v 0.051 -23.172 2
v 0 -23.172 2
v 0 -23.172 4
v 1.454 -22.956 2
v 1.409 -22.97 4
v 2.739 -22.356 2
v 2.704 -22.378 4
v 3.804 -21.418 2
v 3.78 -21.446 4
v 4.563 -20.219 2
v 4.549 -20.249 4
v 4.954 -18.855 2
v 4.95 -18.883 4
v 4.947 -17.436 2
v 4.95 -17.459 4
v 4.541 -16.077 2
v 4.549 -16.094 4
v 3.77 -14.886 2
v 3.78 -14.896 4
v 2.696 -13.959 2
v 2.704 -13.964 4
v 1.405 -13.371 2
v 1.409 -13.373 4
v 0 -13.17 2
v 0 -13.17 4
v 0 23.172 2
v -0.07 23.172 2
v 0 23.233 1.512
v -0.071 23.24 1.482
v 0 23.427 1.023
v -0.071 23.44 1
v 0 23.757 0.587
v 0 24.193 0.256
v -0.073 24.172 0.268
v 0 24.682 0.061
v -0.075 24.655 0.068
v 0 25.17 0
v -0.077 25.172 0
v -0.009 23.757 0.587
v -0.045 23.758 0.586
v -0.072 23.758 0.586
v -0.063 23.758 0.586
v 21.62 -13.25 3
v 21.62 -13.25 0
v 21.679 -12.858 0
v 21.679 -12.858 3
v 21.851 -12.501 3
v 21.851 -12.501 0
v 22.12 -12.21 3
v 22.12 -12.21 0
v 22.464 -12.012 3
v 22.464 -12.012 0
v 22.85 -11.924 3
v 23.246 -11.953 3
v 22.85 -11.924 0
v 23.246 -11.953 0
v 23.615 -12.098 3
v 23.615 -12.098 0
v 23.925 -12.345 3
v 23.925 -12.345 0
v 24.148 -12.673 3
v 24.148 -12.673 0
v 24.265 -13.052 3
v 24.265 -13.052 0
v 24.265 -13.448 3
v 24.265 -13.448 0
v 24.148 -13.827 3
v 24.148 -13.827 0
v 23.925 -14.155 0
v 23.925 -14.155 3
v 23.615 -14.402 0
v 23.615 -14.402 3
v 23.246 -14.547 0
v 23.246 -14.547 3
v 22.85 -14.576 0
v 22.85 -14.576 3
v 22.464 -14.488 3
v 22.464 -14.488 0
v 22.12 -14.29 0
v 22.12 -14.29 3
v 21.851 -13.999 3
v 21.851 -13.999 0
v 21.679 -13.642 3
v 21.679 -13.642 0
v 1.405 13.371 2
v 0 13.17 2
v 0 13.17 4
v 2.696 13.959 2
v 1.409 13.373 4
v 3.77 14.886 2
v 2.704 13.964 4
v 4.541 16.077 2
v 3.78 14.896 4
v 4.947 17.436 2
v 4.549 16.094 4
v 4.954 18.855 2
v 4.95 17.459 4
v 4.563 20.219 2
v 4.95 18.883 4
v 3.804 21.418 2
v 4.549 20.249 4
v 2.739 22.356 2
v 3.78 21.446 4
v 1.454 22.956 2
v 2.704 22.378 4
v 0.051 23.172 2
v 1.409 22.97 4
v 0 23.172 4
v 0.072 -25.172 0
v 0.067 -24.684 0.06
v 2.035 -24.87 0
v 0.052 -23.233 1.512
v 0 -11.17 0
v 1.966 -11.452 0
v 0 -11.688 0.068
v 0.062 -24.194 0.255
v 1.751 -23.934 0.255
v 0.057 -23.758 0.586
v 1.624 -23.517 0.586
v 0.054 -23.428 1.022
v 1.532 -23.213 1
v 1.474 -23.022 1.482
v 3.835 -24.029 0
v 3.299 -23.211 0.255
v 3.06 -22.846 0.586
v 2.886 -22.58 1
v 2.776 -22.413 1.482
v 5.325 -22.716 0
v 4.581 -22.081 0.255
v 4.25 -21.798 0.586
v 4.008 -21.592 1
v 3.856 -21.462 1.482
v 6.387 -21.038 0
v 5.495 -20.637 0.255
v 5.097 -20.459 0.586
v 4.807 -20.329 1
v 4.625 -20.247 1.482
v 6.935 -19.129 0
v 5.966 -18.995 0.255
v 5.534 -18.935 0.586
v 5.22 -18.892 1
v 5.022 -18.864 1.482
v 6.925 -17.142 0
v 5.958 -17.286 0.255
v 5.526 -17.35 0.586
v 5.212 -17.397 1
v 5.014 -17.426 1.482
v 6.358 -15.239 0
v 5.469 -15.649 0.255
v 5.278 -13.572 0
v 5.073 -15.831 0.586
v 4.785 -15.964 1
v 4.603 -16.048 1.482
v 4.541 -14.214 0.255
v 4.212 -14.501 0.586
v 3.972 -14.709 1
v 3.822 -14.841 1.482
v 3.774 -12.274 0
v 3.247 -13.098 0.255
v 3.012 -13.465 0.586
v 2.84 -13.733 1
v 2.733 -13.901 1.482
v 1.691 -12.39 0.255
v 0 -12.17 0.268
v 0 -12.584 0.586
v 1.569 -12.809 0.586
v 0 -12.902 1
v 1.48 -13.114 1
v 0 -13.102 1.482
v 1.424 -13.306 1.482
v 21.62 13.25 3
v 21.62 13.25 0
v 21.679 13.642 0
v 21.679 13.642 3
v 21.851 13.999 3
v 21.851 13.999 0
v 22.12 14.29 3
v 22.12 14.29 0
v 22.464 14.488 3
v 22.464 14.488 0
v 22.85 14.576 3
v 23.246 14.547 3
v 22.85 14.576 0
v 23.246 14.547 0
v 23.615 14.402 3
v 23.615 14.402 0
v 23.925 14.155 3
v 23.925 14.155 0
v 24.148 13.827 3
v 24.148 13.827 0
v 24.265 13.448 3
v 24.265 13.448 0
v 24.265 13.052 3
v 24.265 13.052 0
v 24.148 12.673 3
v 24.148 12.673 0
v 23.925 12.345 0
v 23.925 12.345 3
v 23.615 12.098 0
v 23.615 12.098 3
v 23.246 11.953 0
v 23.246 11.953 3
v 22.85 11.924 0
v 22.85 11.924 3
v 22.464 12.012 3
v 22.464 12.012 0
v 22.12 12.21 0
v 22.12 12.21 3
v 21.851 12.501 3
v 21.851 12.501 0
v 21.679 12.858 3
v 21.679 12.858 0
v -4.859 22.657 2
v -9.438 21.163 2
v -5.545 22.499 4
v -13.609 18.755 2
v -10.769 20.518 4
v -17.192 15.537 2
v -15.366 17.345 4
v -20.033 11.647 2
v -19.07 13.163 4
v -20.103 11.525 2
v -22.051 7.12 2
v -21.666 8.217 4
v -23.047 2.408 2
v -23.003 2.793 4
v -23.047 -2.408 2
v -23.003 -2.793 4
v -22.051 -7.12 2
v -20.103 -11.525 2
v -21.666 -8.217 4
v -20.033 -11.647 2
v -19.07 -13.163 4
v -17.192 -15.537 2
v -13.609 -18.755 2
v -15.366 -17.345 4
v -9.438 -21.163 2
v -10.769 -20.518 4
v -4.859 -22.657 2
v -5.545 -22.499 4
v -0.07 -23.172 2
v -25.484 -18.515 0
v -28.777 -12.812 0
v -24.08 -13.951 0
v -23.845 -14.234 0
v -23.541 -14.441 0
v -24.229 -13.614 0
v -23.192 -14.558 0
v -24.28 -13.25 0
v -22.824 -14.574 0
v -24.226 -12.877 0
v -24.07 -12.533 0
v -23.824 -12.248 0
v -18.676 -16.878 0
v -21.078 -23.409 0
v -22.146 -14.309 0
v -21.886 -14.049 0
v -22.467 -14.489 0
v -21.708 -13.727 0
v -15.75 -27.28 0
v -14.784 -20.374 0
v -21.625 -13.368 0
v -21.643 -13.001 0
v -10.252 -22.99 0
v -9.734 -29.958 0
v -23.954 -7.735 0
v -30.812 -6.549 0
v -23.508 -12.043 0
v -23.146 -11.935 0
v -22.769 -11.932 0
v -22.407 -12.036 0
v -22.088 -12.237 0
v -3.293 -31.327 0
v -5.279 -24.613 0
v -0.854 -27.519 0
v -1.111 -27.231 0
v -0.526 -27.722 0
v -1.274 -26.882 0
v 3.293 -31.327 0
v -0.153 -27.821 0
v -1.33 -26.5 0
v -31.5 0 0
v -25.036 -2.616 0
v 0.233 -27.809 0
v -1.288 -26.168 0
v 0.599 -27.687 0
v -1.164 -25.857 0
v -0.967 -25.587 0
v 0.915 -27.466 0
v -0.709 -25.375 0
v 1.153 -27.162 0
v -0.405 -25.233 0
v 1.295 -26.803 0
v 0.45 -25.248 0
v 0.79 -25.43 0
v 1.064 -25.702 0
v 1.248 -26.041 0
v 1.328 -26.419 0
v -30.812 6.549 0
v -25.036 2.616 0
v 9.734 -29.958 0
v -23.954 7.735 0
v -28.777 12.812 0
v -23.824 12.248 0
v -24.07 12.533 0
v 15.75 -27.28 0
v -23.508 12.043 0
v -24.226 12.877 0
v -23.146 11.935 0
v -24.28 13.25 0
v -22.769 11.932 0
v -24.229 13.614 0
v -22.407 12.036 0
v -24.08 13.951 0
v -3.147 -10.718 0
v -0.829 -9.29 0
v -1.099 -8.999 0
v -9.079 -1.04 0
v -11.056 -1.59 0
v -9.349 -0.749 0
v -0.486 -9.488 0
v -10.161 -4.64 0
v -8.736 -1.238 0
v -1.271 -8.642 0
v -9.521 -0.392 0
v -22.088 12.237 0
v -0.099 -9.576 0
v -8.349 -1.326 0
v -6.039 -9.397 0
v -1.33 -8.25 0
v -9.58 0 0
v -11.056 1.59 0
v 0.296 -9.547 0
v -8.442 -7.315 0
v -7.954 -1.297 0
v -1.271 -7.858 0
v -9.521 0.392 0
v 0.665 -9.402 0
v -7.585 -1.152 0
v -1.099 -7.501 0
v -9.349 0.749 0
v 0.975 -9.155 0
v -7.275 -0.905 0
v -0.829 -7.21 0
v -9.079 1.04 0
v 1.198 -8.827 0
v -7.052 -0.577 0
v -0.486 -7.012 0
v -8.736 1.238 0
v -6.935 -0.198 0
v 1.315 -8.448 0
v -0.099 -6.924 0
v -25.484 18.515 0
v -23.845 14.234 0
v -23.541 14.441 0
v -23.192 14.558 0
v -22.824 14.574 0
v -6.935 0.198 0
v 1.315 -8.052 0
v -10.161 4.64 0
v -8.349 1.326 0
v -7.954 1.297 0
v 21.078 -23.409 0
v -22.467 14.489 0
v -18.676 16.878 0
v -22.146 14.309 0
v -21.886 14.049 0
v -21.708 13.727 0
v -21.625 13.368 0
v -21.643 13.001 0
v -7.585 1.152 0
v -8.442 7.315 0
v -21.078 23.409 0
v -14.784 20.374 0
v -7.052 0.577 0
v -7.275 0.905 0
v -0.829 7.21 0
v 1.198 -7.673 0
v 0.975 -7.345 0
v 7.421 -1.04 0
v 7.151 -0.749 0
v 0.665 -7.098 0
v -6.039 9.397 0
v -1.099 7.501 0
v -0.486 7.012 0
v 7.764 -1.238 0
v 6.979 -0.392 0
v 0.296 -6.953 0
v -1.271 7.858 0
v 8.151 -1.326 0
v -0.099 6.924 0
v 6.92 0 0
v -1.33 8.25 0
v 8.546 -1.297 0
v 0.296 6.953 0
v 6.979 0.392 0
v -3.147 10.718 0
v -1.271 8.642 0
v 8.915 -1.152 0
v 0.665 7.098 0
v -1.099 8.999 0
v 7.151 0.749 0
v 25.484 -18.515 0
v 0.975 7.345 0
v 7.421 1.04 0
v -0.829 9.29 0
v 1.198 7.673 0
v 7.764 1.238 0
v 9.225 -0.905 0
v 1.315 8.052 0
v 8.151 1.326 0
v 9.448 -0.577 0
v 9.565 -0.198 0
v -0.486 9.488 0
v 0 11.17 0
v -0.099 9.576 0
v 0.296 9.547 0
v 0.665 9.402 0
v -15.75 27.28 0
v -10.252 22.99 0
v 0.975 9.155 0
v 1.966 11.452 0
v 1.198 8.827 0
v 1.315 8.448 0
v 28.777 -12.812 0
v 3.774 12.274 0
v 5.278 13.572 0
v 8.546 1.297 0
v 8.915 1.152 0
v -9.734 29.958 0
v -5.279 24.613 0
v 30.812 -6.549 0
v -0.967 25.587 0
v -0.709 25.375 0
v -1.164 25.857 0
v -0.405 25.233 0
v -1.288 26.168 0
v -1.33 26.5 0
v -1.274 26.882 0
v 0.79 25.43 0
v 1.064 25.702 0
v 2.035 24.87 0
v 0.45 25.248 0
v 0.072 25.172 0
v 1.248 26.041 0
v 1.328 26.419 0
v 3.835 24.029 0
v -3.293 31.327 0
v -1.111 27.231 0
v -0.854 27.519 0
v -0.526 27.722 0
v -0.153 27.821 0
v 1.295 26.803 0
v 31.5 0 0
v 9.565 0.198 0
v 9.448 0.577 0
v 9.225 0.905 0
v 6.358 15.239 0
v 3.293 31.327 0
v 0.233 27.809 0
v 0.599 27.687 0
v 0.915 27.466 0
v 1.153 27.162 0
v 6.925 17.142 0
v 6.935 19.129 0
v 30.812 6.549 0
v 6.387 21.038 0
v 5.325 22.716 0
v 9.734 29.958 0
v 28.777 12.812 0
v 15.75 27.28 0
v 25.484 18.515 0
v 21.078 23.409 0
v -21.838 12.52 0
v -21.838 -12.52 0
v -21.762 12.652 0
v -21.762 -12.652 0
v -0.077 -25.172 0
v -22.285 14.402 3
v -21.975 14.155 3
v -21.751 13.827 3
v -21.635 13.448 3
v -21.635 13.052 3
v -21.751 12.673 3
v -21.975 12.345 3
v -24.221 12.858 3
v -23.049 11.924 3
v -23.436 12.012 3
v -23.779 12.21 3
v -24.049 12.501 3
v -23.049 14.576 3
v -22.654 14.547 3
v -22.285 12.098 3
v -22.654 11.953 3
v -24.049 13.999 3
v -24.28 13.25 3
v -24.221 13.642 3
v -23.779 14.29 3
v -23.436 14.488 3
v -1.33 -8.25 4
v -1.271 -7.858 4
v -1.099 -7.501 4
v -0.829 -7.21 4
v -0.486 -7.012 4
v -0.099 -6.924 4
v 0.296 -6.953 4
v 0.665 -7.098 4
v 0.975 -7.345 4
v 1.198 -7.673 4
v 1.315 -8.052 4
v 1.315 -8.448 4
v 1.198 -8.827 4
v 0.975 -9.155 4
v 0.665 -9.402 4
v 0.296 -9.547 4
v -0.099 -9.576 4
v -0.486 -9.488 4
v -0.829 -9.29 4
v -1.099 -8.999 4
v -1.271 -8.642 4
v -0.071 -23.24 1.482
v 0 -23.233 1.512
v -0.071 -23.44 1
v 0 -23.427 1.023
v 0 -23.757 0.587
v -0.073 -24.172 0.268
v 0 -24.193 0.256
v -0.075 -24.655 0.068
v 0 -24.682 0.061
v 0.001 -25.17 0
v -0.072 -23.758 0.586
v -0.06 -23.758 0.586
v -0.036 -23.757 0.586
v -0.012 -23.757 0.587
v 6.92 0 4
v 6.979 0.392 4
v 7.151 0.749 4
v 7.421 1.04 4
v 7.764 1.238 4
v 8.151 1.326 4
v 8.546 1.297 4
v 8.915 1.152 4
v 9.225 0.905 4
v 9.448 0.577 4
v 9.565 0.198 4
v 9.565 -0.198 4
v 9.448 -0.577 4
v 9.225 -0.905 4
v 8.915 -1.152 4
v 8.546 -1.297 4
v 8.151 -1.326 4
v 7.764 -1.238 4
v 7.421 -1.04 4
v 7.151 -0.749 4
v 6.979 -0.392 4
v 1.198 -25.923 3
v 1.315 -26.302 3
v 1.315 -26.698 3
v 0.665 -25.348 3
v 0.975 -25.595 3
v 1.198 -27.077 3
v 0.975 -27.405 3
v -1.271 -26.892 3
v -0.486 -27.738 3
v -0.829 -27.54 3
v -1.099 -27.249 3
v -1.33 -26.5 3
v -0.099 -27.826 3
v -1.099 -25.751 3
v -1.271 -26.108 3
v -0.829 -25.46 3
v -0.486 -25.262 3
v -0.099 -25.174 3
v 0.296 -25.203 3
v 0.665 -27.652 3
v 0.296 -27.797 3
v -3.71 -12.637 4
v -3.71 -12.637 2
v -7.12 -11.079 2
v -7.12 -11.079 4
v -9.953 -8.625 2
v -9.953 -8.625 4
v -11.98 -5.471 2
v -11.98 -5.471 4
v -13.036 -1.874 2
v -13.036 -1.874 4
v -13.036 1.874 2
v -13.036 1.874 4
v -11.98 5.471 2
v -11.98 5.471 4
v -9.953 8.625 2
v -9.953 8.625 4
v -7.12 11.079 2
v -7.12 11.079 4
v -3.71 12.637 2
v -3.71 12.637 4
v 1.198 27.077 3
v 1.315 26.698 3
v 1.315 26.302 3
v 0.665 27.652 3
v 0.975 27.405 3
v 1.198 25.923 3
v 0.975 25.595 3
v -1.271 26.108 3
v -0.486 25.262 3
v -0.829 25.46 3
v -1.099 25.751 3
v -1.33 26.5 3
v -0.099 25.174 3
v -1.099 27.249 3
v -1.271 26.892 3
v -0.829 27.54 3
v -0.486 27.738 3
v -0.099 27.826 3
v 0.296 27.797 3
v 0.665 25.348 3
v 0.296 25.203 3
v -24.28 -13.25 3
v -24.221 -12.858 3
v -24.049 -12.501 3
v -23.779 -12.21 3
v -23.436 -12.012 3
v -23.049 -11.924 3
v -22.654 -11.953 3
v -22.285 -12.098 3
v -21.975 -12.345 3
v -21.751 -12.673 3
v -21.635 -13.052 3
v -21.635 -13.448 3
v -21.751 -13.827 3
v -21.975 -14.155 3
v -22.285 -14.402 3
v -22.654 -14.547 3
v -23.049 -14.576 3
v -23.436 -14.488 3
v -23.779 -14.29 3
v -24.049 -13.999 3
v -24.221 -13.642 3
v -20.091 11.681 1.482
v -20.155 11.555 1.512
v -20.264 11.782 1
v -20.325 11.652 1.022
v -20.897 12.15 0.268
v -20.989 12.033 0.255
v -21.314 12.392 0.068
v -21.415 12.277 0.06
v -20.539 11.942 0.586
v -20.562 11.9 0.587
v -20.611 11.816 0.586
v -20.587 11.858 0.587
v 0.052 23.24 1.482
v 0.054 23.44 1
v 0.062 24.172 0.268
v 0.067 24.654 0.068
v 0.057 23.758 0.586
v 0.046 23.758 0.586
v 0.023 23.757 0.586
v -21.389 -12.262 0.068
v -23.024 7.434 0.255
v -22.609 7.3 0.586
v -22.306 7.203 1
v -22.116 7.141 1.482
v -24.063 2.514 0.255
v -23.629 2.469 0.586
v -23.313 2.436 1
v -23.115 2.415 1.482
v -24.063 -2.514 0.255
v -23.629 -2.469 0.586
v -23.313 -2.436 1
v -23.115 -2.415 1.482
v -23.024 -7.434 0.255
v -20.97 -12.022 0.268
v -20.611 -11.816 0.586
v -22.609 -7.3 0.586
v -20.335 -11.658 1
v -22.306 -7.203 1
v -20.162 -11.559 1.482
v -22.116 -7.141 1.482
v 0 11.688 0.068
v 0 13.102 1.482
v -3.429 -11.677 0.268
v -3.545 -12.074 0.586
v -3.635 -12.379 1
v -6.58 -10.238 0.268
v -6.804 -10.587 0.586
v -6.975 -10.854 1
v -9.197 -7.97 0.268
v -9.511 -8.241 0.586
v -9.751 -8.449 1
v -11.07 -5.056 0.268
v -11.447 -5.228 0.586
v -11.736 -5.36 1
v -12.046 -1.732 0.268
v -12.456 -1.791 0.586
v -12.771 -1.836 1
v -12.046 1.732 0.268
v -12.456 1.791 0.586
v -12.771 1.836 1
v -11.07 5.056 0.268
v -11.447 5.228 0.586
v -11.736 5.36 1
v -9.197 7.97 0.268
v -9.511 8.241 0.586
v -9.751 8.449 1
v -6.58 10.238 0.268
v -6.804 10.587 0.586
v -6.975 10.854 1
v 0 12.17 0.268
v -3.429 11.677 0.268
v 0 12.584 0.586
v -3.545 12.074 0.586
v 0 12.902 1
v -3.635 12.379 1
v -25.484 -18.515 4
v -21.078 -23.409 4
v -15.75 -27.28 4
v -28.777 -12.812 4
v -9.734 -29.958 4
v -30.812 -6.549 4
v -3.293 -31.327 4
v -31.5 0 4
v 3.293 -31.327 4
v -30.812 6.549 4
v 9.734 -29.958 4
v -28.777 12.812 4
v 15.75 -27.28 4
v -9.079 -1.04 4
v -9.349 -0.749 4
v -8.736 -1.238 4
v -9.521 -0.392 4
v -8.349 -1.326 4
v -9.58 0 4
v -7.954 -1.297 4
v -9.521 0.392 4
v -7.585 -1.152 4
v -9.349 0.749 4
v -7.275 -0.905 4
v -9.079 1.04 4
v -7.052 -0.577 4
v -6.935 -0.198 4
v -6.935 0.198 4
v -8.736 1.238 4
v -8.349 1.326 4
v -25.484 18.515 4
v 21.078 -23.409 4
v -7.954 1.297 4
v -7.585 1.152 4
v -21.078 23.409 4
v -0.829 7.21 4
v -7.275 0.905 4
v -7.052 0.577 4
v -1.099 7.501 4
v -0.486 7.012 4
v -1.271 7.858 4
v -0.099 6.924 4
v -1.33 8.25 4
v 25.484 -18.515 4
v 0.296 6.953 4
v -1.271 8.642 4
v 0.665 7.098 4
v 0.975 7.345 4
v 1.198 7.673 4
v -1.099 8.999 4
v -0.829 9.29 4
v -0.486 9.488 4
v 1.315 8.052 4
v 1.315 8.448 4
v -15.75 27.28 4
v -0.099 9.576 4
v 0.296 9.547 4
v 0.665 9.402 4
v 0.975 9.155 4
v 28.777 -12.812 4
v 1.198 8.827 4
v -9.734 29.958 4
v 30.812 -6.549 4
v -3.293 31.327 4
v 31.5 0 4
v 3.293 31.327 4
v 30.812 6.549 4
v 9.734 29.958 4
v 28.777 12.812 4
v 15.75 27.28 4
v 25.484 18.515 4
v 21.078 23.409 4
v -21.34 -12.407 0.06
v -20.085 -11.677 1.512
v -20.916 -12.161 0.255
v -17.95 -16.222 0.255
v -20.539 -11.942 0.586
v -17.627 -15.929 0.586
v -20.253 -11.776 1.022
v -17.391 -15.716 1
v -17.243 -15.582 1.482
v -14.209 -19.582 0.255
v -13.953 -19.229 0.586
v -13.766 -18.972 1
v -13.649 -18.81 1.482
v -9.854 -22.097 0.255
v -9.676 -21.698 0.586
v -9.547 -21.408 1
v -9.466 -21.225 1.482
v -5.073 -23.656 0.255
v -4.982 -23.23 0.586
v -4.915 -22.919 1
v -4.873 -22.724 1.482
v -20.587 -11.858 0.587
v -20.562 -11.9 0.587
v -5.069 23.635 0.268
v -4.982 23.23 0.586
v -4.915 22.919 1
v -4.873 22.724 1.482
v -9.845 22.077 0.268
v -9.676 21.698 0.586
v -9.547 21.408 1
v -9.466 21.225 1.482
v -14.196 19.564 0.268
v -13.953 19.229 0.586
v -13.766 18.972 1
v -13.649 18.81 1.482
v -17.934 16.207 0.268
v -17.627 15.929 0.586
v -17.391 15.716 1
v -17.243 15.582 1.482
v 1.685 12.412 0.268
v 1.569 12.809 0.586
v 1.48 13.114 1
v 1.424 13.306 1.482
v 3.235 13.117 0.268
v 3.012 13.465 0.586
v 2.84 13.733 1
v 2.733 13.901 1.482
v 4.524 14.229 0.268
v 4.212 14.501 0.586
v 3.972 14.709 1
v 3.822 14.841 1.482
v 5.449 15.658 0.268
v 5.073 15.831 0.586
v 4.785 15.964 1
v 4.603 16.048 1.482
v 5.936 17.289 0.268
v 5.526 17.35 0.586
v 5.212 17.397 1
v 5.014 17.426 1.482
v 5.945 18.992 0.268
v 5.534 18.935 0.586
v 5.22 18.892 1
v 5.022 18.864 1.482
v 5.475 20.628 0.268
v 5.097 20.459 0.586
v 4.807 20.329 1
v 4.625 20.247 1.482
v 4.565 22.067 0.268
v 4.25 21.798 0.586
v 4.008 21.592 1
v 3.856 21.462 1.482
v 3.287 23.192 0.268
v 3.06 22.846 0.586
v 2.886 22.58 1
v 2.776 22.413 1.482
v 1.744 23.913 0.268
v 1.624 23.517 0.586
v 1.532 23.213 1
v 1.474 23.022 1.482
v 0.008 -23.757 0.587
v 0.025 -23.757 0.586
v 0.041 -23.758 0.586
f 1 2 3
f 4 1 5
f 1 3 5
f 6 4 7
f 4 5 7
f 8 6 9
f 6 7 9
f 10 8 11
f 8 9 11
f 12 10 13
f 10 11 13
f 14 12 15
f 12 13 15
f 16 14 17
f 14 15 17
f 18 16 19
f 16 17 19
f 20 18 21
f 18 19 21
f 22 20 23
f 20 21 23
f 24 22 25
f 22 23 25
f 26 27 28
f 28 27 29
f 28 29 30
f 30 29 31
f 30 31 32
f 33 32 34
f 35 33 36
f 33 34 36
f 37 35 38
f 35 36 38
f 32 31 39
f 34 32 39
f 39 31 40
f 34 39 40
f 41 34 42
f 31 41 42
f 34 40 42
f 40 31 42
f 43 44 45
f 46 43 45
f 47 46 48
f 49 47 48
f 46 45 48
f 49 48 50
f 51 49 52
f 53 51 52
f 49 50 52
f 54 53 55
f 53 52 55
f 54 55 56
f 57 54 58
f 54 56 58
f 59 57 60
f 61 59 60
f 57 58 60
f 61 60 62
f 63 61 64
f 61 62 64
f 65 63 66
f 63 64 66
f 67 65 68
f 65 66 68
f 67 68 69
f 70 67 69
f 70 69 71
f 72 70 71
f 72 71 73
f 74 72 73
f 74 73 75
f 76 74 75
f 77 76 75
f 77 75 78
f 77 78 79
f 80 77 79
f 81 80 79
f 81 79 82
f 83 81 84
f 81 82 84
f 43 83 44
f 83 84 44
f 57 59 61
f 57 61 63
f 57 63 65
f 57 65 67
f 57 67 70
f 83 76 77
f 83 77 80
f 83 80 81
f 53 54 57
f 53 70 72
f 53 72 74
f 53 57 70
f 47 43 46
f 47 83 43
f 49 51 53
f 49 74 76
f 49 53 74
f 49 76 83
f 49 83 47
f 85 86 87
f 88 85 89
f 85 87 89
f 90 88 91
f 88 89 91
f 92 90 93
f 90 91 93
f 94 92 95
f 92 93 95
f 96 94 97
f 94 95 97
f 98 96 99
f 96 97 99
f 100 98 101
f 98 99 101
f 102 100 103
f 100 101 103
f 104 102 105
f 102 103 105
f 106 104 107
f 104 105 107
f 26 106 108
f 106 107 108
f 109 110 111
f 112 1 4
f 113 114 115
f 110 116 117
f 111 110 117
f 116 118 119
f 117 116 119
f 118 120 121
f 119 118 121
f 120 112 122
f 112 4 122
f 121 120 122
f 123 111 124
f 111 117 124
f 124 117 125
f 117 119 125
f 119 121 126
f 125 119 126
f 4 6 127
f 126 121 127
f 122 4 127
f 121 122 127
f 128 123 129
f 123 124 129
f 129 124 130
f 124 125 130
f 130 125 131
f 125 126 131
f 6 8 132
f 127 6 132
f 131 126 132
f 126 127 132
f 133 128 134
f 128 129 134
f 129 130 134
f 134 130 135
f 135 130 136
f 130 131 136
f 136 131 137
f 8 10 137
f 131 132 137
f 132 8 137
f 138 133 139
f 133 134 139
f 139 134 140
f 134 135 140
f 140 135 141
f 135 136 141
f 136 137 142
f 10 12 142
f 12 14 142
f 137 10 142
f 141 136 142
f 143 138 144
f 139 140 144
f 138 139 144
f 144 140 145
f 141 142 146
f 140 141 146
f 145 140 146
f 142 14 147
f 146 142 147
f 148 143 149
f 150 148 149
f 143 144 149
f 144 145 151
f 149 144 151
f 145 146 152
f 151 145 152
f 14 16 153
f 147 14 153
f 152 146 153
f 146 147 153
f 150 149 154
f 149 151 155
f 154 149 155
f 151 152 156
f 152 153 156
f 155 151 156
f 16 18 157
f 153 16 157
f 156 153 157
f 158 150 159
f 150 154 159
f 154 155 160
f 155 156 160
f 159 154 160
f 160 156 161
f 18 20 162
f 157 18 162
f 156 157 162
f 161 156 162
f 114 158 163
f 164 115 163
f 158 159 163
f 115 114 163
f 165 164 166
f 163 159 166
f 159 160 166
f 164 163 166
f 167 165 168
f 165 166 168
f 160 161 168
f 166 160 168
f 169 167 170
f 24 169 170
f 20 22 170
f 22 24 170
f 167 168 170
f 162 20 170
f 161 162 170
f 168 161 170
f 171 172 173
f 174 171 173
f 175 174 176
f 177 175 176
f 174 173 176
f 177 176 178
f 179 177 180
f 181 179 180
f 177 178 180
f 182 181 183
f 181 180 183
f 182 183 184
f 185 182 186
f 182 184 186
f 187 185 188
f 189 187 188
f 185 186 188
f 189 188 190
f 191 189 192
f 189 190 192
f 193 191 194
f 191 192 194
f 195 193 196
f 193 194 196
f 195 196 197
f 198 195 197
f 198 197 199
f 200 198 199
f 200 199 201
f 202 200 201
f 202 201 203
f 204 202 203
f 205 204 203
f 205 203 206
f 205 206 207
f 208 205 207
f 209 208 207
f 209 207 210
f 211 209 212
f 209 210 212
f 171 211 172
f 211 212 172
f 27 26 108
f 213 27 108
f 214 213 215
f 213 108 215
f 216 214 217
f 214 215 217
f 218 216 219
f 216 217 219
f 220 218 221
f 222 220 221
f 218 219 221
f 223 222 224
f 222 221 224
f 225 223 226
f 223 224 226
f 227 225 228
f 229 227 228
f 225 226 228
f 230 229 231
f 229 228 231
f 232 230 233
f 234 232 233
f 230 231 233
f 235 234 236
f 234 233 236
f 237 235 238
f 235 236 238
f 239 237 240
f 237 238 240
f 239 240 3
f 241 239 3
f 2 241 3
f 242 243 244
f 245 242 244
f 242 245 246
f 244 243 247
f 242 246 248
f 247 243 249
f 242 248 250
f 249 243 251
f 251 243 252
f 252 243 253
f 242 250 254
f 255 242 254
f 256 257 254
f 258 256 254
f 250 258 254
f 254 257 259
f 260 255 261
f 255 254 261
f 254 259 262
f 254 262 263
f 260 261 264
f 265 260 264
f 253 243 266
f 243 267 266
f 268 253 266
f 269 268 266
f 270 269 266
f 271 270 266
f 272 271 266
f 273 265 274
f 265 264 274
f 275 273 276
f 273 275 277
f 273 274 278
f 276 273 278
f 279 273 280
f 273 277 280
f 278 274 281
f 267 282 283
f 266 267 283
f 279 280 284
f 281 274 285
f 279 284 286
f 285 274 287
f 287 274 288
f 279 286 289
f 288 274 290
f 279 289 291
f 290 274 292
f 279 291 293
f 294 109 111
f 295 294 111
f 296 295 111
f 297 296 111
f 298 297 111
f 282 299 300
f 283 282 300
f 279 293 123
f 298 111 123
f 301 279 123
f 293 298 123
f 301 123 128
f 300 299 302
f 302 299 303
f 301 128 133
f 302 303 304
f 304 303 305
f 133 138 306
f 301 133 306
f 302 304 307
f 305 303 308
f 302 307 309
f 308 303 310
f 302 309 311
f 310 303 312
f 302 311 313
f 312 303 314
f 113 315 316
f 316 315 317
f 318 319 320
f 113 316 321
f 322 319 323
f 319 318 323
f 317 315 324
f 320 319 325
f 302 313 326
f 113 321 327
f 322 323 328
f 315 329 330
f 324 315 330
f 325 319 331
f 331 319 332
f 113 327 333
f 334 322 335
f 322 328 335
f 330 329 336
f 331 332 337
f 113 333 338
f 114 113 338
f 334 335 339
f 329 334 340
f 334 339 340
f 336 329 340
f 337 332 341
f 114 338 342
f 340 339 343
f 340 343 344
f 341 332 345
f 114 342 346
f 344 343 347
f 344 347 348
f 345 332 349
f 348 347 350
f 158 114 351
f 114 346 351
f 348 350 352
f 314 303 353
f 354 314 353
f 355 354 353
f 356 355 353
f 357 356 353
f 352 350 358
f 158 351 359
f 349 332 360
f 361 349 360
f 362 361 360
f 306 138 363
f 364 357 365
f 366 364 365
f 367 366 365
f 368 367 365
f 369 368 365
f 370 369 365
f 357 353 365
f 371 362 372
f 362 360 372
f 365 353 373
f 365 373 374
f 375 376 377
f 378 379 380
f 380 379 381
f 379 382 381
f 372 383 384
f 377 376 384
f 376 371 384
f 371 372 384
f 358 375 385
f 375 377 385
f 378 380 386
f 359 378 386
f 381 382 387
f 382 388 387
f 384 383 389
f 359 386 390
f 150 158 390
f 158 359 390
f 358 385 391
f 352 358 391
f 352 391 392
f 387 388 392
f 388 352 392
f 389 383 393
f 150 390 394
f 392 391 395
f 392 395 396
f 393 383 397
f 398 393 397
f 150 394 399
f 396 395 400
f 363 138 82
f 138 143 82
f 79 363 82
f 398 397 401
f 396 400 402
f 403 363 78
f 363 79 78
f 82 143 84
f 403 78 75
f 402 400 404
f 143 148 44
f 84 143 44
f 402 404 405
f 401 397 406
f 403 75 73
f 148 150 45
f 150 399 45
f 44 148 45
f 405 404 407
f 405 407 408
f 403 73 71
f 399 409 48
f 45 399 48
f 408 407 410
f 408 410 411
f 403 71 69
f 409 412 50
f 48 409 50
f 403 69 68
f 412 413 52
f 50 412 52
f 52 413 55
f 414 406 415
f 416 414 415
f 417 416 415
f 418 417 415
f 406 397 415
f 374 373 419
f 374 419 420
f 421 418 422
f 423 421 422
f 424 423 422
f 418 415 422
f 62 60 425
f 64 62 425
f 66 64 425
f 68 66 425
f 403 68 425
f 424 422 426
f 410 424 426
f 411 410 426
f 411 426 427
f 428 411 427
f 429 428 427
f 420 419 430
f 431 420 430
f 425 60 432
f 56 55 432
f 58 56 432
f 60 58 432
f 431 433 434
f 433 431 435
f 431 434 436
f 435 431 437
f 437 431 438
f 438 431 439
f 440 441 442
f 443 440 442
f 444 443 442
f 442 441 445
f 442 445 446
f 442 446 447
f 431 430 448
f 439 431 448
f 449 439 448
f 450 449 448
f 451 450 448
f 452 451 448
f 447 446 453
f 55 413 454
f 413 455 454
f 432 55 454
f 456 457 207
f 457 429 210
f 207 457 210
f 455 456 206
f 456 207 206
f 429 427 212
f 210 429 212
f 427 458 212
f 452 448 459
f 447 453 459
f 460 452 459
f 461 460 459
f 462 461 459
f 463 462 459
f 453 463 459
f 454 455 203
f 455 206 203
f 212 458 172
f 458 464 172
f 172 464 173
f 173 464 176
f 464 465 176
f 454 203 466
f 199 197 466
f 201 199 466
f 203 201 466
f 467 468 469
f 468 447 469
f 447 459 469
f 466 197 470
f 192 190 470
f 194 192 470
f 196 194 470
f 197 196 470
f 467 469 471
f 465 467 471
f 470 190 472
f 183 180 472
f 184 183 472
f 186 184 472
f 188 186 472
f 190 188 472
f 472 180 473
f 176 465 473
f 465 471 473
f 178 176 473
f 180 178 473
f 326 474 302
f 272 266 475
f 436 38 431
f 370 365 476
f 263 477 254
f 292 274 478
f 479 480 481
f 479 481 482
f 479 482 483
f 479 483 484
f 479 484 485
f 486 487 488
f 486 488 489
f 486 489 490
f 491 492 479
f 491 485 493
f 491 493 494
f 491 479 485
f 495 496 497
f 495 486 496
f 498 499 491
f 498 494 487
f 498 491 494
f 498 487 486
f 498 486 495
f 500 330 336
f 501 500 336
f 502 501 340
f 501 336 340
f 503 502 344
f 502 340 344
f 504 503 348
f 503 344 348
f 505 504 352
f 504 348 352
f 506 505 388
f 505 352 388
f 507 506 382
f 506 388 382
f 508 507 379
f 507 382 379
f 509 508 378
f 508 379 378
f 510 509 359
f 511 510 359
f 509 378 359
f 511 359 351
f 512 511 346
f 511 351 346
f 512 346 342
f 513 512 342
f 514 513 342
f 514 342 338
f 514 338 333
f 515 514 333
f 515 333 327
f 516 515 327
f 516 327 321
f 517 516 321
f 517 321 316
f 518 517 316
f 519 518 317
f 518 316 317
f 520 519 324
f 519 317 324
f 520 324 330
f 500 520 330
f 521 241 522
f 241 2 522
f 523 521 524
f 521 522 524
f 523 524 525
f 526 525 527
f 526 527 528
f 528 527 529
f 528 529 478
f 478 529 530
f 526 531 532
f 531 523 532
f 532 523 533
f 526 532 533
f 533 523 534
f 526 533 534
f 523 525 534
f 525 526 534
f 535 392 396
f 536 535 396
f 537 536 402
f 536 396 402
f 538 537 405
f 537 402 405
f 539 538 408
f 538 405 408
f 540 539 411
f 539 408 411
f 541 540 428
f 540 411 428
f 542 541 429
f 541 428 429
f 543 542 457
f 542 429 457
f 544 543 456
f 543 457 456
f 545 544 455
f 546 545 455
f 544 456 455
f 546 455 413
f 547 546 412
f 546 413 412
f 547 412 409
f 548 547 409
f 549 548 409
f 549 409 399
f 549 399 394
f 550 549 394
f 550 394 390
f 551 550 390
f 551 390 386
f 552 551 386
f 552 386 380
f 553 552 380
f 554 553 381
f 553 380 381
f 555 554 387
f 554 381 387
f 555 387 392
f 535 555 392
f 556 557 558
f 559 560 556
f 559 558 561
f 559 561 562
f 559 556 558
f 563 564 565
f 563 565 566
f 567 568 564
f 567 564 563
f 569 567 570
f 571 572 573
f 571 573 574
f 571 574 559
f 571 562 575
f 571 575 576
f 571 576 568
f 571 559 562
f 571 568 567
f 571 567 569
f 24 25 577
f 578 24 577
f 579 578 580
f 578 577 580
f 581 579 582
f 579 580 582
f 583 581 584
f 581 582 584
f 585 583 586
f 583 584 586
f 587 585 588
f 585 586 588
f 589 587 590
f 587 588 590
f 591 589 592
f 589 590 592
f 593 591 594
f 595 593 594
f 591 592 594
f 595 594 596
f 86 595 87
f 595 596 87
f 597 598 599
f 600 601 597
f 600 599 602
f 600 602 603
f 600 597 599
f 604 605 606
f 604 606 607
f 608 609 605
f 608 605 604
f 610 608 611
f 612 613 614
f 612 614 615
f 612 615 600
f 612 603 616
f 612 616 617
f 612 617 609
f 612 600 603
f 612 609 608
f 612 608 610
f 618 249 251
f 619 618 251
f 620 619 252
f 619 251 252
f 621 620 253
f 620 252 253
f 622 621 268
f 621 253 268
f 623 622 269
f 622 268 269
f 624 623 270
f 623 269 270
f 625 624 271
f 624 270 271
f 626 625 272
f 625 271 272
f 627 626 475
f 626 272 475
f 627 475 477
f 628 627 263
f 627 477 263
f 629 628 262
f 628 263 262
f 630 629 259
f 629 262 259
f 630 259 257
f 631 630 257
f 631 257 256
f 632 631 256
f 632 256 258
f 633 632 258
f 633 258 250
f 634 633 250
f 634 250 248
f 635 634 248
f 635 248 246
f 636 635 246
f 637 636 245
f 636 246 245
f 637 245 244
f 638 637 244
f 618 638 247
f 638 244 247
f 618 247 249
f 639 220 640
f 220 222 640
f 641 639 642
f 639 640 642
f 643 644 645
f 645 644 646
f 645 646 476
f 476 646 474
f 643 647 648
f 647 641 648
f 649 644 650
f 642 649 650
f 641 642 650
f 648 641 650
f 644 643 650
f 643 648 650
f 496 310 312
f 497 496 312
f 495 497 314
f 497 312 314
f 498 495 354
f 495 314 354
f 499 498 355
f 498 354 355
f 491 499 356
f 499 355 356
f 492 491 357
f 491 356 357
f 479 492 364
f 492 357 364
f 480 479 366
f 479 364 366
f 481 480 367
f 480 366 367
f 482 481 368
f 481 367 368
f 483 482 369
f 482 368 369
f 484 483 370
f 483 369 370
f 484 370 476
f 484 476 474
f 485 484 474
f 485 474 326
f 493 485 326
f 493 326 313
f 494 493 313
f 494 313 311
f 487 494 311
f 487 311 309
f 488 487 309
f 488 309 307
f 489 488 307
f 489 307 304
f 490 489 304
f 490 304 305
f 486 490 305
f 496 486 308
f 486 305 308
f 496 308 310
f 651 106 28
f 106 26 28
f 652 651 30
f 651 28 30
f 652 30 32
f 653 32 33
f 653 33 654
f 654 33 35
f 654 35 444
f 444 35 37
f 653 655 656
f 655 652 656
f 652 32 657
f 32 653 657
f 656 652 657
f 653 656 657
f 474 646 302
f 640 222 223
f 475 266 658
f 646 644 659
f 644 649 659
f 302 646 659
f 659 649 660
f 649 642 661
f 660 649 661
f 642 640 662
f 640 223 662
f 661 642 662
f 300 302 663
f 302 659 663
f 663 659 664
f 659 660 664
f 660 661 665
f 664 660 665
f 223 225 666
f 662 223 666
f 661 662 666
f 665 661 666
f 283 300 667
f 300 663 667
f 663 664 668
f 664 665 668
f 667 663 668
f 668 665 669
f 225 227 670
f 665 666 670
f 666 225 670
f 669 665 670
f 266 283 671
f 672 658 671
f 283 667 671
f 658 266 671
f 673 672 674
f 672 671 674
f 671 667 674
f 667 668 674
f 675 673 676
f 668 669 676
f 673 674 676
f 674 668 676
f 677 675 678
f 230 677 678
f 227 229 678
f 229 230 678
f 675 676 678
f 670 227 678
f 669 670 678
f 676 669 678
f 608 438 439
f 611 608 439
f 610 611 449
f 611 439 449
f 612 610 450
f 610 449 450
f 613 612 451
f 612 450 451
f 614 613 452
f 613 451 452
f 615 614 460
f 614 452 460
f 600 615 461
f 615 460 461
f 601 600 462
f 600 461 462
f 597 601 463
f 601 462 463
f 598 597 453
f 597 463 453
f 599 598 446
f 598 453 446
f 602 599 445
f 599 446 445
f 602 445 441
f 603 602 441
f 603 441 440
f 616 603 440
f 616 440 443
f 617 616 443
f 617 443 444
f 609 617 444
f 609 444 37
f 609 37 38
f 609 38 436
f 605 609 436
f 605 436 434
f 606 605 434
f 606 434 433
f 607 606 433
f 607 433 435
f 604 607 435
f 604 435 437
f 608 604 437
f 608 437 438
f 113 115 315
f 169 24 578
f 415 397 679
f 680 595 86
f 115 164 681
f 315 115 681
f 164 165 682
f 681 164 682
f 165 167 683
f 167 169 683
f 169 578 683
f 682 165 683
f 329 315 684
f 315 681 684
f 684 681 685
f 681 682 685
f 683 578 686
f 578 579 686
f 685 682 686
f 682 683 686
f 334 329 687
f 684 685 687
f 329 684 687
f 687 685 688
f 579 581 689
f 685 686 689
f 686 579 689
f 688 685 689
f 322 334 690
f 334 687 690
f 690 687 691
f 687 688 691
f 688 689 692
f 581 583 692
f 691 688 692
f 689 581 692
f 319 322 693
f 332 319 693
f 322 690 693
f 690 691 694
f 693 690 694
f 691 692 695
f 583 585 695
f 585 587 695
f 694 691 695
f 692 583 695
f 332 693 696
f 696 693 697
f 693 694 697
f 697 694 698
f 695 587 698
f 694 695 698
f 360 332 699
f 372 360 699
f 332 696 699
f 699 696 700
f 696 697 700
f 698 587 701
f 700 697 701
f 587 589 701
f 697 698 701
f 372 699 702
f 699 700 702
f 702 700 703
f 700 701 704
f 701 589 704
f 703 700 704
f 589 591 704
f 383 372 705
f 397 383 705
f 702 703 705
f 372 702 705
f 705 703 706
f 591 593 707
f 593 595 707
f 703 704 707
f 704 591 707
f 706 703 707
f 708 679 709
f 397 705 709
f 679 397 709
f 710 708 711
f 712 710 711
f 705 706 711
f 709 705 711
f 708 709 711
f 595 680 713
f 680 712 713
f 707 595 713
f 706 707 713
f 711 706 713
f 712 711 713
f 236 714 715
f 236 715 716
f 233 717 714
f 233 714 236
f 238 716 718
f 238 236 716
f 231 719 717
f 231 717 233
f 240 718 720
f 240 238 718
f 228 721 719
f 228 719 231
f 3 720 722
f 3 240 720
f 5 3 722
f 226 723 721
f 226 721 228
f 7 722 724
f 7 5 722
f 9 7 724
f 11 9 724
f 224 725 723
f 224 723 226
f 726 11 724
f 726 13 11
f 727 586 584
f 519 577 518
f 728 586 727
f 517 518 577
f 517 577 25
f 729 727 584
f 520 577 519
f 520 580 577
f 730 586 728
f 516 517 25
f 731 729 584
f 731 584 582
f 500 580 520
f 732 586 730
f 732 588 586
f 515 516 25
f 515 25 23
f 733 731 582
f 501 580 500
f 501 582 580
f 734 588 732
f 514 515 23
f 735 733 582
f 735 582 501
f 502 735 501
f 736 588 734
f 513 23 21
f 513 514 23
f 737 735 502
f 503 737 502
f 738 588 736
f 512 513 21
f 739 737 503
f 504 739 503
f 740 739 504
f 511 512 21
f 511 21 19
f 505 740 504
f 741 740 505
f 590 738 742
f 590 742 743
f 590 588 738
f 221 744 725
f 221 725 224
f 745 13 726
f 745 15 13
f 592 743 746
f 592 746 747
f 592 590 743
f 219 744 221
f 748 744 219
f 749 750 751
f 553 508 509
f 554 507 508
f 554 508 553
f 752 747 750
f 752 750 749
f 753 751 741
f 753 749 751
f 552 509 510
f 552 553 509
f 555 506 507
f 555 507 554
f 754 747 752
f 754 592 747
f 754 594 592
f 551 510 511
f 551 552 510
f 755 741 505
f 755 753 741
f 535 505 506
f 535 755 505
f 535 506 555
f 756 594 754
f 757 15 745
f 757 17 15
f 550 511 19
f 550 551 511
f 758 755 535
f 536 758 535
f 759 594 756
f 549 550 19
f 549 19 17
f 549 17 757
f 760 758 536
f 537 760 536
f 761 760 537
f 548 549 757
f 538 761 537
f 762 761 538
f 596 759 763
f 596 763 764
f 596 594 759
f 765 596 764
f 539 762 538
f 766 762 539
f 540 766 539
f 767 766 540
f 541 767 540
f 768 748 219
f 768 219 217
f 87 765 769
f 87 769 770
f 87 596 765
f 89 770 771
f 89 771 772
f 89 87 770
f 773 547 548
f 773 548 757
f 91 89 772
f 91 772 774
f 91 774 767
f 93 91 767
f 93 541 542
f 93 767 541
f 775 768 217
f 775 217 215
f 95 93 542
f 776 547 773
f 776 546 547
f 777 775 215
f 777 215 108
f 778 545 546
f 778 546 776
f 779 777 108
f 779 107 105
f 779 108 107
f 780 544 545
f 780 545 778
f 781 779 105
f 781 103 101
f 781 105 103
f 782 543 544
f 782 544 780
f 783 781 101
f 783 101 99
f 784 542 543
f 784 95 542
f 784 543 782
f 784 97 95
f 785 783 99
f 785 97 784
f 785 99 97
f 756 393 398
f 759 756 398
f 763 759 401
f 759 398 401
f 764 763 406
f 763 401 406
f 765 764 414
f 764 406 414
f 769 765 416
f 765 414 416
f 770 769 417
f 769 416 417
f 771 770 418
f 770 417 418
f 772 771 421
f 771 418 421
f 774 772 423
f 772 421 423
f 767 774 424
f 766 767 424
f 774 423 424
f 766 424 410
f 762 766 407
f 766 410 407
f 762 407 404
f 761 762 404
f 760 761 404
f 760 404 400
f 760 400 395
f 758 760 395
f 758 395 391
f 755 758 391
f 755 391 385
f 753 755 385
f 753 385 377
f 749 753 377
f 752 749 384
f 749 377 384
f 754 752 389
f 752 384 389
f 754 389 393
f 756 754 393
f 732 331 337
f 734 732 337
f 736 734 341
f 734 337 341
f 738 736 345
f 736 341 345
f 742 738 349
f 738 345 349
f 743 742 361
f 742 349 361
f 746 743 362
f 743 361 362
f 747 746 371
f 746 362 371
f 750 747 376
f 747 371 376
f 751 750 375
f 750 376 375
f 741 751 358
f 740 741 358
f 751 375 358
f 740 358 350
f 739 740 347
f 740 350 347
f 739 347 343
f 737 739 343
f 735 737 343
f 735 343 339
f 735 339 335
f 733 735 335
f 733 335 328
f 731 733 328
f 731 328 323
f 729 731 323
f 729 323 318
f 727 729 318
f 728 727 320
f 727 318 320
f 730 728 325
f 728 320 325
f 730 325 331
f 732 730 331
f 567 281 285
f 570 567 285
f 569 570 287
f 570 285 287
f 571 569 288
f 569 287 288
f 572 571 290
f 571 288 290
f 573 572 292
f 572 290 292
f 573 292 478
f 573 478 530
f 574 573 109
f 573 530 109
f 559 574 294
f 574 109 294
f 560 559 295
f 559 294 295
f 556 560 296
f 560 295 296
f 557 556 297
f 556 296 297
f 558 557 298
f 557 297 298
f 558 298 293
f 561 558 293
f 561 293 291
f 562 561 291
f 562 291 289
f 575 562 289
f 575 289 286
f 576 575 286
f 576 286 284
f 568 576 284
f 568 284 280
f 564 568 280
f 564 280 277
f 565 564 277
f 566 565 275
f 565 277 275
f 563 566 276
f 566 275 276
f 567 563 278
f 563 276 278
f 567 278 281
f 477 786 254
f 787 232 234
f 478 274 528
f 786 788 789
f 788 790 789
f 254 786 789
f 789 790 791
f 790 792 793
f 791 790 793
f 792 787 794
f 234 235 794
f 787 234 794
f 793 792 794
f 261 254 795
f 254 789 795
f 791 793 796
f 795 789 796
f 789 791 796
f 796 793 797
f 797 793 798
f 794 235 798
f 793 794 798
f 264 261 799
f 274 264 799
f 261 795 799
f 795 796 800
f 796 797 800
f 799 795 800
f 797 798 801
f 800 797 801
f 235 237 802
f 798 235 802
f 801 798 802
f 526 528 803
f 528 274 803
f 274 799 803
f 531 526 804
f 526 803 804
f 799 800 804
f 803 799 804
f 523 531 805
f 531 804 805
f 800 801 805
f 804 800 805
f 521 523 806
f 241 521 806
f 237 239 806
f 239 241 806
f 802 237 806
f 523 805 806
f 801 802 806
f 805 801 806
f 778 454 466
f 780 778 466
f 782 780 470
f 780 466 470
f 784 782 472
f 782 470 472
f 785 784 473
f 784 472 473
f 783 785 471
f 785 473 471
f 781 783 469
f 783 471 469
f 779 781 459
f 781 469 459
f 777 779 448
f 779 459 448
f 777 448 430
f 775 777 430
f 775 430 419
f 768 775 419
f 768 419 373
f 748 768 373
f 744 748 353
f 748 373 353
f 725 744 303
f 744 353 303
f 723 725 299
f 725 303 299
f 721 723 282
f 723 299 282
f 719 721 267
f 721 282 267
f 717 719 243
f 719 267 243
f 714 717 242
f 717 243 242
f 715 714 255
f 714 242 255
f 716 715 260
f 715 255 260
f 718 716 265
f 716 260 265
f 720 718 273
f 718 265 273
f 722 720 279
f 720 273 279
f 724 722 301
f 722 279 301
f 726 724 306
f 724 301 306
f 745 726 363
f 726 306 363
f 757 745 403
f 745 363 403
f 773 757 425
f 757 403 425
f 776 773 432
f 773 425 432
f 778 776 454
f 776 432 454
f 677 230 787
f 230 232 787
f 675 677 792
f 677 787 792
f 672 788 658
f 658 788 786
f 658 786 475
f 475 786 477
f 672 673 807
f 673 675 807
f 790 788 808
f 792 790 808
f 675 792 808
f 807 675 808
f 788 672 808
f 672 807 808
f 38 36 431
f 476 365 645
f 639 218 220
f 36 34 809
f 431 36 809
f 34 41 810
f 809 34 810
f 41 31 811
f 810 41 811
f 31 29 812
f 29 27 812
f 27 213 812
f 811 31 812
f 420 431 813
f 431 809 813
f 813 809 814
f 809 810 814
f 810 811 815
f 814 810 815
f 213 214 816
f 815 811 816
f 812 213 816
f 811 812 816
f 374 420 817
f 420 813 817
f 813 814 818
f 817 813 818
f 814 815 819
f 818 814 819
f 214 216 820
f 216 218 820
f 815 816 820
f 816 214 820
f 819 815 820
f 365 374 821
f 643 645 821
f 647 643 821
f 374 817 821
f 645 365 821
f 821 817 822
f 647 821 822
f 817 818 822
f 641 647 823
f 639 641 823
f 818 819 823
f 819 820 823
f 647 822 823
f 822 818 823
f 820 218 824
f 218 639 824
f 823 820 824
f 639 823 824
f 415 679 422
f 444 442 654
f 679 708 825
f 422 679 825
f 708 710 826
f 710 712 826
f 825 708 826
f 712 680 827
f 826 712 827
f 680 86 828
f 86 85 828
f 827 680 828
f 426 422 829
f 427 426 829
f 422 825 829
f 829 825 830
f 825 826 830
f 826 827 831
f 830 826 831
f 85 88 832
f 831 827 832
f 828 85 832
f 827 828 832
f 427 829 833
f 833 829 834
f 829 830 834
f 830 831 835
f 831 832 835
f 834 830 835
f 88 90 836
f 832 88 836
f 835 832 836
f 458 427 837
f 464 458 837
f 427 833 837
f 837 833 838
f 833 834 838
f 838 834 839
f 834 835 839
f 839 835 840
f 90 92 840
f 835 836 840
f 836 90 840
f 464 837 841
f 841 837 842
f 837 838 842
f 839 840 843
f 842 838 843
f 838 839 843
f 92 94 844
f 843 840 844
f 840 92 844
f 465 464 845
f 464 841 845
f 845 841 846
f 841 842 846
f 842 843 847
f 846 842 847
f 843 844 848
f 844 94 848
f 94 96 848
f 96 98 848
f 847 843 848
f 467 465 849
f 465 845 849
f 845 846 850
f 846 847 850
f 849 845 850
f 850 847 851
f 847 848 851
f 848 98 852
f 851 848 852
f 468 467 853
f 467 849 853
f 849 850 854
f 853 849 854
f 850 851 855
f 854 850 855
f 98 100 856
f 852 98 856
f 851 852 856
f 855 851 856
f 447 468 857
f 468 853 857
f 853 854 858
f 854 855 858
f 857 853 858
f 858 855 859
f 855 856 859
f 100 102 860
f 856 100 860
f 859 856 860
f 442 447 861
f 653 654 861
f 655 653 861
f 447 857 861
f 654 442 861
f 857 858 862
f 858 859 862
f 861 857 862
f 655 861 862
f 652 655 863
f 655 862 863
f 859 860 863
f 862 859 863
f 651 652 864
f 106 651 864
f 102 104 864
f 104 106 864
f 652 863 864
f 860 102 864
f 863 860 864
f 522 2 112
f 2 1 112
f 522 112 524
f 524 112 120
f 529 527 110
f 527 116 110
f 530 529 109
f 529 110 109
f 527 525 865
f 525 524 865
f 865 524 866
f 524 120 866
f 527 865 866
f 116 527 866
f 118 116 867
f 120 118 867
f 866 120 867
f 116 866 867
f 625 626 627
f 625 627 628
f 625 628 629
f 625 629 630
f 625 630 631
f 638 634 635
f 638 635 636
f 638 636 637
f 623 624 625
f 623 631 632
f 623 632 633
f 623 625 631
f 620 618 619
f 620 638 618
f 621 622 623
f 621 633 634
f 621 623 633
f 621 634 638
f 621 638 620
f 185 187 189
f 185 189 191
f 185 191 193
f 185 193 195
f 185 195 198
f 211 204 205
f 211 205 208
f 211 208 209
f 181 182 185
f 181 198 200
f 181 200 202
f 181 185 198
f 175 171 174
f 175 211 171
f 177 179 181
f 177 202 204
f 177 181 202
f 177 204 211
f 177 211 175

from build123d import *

# Parameters (mm, degrees)
SKETCH1_R              = 31.5
ELBOW_PLATE_DEPTH      = 4
SKETCH2_R              = 1.33
HORN_SCREW_HOLES_DEPTH = 4
SKETCH3_R              = 1.33
SCREW_HOLES_DEPTH      = 3
CABLE_SLOT_DEPTH       = 4
FILLET1_R              = 2


with BuildPart() as part:
    # Sketch1 → Elbow Plate (new body)
    with BuildSketch(Plane.XY):
        Circle(SKETCH1_R)
    extrude(amount=ELBOW_PLATE_DEPTH)

    # Sketch2 → Horn Screw Holes (cut)
    with BuildSketch(Plane(origin=(0, 0, 0), x_dir=(-1, 0, 0), z_dir=(0, 0, -1))):
        with Locations((0, 8.25)):
            Circle(SKETCH2_R)
        with Locations((8.25, 0)):
            Circle(SKETCH2_R)
        with Locations((0, -8.25)):
            Circle(SKETCH2_R)
        with Locations((-8.25, 0)):
            Circle(SKETCH2_R)
    extrude(amount=-HORN_SCREW_HOLES_DEPTH, mode=Mode.SUBTRACT)

    # Sketch3 → Screw Holes (cut)
    with BuildSketch(Plane(origin=(0, 0, 0), x_dir=(-1, 0, 0), z_dir=(0, 0, -1))):
        with Locations((22.9496732, 13.25)):
            Circle(SKETCH3_R)
        with Locations((0, 26.5)):
            Circle(SKETCH3_R)
        with Locations((22.9496732, -13.25)):
            Circle(SKETCH3_R)
        with Locations((0, -26.5)):
            Circle(SKETCH3_R)
        with Locations((-22.9496732, -13.25)):
            Circle(SKETCH3_R)
        with Locations((-22.9496732, 13.25)):
            Circle(SKETCH3_R)
    extrude(amount=-SCREW_HOLES_DEPTH, mode=Mode.SUBTRACT)

    # Sketch4 → Cable Slot (cut)
    with BuildSketch(Plane.XY.offset(4)):
        with BuildLine():
            ThreePointArc((0, -23.172318516), (5.001159258, -18.171159258), (0, -13.17))
            ThreePointArc((0, -13.17), (-13.17, 0), (0, 13.17))
            ThreePointArc((0, 13.17), (5.001159258, 18.171159258), (0, 23.172318516))
            ThreePointArc((0, 23.172318516), (-23.172318516, 0), (0, -23.172318516))
        make_face()
    extrude(amount=-CABLE_SLOT_DEPTH, mode=Mode.SUBTRACT)

    # Fillet1
    fillet1_edges = [part.edges().sort_by_distance(p)[0] for p in [
        (-23.172318516, 0, 0),
        (5.001159258, 18.171159258, 0),
        (-13.17, 0, 0),
        (5.001159258, -18.171159258, 0),
    ]]
    fillet(fillet1_edges, radius=FILLET1_R)


solid = part.part
